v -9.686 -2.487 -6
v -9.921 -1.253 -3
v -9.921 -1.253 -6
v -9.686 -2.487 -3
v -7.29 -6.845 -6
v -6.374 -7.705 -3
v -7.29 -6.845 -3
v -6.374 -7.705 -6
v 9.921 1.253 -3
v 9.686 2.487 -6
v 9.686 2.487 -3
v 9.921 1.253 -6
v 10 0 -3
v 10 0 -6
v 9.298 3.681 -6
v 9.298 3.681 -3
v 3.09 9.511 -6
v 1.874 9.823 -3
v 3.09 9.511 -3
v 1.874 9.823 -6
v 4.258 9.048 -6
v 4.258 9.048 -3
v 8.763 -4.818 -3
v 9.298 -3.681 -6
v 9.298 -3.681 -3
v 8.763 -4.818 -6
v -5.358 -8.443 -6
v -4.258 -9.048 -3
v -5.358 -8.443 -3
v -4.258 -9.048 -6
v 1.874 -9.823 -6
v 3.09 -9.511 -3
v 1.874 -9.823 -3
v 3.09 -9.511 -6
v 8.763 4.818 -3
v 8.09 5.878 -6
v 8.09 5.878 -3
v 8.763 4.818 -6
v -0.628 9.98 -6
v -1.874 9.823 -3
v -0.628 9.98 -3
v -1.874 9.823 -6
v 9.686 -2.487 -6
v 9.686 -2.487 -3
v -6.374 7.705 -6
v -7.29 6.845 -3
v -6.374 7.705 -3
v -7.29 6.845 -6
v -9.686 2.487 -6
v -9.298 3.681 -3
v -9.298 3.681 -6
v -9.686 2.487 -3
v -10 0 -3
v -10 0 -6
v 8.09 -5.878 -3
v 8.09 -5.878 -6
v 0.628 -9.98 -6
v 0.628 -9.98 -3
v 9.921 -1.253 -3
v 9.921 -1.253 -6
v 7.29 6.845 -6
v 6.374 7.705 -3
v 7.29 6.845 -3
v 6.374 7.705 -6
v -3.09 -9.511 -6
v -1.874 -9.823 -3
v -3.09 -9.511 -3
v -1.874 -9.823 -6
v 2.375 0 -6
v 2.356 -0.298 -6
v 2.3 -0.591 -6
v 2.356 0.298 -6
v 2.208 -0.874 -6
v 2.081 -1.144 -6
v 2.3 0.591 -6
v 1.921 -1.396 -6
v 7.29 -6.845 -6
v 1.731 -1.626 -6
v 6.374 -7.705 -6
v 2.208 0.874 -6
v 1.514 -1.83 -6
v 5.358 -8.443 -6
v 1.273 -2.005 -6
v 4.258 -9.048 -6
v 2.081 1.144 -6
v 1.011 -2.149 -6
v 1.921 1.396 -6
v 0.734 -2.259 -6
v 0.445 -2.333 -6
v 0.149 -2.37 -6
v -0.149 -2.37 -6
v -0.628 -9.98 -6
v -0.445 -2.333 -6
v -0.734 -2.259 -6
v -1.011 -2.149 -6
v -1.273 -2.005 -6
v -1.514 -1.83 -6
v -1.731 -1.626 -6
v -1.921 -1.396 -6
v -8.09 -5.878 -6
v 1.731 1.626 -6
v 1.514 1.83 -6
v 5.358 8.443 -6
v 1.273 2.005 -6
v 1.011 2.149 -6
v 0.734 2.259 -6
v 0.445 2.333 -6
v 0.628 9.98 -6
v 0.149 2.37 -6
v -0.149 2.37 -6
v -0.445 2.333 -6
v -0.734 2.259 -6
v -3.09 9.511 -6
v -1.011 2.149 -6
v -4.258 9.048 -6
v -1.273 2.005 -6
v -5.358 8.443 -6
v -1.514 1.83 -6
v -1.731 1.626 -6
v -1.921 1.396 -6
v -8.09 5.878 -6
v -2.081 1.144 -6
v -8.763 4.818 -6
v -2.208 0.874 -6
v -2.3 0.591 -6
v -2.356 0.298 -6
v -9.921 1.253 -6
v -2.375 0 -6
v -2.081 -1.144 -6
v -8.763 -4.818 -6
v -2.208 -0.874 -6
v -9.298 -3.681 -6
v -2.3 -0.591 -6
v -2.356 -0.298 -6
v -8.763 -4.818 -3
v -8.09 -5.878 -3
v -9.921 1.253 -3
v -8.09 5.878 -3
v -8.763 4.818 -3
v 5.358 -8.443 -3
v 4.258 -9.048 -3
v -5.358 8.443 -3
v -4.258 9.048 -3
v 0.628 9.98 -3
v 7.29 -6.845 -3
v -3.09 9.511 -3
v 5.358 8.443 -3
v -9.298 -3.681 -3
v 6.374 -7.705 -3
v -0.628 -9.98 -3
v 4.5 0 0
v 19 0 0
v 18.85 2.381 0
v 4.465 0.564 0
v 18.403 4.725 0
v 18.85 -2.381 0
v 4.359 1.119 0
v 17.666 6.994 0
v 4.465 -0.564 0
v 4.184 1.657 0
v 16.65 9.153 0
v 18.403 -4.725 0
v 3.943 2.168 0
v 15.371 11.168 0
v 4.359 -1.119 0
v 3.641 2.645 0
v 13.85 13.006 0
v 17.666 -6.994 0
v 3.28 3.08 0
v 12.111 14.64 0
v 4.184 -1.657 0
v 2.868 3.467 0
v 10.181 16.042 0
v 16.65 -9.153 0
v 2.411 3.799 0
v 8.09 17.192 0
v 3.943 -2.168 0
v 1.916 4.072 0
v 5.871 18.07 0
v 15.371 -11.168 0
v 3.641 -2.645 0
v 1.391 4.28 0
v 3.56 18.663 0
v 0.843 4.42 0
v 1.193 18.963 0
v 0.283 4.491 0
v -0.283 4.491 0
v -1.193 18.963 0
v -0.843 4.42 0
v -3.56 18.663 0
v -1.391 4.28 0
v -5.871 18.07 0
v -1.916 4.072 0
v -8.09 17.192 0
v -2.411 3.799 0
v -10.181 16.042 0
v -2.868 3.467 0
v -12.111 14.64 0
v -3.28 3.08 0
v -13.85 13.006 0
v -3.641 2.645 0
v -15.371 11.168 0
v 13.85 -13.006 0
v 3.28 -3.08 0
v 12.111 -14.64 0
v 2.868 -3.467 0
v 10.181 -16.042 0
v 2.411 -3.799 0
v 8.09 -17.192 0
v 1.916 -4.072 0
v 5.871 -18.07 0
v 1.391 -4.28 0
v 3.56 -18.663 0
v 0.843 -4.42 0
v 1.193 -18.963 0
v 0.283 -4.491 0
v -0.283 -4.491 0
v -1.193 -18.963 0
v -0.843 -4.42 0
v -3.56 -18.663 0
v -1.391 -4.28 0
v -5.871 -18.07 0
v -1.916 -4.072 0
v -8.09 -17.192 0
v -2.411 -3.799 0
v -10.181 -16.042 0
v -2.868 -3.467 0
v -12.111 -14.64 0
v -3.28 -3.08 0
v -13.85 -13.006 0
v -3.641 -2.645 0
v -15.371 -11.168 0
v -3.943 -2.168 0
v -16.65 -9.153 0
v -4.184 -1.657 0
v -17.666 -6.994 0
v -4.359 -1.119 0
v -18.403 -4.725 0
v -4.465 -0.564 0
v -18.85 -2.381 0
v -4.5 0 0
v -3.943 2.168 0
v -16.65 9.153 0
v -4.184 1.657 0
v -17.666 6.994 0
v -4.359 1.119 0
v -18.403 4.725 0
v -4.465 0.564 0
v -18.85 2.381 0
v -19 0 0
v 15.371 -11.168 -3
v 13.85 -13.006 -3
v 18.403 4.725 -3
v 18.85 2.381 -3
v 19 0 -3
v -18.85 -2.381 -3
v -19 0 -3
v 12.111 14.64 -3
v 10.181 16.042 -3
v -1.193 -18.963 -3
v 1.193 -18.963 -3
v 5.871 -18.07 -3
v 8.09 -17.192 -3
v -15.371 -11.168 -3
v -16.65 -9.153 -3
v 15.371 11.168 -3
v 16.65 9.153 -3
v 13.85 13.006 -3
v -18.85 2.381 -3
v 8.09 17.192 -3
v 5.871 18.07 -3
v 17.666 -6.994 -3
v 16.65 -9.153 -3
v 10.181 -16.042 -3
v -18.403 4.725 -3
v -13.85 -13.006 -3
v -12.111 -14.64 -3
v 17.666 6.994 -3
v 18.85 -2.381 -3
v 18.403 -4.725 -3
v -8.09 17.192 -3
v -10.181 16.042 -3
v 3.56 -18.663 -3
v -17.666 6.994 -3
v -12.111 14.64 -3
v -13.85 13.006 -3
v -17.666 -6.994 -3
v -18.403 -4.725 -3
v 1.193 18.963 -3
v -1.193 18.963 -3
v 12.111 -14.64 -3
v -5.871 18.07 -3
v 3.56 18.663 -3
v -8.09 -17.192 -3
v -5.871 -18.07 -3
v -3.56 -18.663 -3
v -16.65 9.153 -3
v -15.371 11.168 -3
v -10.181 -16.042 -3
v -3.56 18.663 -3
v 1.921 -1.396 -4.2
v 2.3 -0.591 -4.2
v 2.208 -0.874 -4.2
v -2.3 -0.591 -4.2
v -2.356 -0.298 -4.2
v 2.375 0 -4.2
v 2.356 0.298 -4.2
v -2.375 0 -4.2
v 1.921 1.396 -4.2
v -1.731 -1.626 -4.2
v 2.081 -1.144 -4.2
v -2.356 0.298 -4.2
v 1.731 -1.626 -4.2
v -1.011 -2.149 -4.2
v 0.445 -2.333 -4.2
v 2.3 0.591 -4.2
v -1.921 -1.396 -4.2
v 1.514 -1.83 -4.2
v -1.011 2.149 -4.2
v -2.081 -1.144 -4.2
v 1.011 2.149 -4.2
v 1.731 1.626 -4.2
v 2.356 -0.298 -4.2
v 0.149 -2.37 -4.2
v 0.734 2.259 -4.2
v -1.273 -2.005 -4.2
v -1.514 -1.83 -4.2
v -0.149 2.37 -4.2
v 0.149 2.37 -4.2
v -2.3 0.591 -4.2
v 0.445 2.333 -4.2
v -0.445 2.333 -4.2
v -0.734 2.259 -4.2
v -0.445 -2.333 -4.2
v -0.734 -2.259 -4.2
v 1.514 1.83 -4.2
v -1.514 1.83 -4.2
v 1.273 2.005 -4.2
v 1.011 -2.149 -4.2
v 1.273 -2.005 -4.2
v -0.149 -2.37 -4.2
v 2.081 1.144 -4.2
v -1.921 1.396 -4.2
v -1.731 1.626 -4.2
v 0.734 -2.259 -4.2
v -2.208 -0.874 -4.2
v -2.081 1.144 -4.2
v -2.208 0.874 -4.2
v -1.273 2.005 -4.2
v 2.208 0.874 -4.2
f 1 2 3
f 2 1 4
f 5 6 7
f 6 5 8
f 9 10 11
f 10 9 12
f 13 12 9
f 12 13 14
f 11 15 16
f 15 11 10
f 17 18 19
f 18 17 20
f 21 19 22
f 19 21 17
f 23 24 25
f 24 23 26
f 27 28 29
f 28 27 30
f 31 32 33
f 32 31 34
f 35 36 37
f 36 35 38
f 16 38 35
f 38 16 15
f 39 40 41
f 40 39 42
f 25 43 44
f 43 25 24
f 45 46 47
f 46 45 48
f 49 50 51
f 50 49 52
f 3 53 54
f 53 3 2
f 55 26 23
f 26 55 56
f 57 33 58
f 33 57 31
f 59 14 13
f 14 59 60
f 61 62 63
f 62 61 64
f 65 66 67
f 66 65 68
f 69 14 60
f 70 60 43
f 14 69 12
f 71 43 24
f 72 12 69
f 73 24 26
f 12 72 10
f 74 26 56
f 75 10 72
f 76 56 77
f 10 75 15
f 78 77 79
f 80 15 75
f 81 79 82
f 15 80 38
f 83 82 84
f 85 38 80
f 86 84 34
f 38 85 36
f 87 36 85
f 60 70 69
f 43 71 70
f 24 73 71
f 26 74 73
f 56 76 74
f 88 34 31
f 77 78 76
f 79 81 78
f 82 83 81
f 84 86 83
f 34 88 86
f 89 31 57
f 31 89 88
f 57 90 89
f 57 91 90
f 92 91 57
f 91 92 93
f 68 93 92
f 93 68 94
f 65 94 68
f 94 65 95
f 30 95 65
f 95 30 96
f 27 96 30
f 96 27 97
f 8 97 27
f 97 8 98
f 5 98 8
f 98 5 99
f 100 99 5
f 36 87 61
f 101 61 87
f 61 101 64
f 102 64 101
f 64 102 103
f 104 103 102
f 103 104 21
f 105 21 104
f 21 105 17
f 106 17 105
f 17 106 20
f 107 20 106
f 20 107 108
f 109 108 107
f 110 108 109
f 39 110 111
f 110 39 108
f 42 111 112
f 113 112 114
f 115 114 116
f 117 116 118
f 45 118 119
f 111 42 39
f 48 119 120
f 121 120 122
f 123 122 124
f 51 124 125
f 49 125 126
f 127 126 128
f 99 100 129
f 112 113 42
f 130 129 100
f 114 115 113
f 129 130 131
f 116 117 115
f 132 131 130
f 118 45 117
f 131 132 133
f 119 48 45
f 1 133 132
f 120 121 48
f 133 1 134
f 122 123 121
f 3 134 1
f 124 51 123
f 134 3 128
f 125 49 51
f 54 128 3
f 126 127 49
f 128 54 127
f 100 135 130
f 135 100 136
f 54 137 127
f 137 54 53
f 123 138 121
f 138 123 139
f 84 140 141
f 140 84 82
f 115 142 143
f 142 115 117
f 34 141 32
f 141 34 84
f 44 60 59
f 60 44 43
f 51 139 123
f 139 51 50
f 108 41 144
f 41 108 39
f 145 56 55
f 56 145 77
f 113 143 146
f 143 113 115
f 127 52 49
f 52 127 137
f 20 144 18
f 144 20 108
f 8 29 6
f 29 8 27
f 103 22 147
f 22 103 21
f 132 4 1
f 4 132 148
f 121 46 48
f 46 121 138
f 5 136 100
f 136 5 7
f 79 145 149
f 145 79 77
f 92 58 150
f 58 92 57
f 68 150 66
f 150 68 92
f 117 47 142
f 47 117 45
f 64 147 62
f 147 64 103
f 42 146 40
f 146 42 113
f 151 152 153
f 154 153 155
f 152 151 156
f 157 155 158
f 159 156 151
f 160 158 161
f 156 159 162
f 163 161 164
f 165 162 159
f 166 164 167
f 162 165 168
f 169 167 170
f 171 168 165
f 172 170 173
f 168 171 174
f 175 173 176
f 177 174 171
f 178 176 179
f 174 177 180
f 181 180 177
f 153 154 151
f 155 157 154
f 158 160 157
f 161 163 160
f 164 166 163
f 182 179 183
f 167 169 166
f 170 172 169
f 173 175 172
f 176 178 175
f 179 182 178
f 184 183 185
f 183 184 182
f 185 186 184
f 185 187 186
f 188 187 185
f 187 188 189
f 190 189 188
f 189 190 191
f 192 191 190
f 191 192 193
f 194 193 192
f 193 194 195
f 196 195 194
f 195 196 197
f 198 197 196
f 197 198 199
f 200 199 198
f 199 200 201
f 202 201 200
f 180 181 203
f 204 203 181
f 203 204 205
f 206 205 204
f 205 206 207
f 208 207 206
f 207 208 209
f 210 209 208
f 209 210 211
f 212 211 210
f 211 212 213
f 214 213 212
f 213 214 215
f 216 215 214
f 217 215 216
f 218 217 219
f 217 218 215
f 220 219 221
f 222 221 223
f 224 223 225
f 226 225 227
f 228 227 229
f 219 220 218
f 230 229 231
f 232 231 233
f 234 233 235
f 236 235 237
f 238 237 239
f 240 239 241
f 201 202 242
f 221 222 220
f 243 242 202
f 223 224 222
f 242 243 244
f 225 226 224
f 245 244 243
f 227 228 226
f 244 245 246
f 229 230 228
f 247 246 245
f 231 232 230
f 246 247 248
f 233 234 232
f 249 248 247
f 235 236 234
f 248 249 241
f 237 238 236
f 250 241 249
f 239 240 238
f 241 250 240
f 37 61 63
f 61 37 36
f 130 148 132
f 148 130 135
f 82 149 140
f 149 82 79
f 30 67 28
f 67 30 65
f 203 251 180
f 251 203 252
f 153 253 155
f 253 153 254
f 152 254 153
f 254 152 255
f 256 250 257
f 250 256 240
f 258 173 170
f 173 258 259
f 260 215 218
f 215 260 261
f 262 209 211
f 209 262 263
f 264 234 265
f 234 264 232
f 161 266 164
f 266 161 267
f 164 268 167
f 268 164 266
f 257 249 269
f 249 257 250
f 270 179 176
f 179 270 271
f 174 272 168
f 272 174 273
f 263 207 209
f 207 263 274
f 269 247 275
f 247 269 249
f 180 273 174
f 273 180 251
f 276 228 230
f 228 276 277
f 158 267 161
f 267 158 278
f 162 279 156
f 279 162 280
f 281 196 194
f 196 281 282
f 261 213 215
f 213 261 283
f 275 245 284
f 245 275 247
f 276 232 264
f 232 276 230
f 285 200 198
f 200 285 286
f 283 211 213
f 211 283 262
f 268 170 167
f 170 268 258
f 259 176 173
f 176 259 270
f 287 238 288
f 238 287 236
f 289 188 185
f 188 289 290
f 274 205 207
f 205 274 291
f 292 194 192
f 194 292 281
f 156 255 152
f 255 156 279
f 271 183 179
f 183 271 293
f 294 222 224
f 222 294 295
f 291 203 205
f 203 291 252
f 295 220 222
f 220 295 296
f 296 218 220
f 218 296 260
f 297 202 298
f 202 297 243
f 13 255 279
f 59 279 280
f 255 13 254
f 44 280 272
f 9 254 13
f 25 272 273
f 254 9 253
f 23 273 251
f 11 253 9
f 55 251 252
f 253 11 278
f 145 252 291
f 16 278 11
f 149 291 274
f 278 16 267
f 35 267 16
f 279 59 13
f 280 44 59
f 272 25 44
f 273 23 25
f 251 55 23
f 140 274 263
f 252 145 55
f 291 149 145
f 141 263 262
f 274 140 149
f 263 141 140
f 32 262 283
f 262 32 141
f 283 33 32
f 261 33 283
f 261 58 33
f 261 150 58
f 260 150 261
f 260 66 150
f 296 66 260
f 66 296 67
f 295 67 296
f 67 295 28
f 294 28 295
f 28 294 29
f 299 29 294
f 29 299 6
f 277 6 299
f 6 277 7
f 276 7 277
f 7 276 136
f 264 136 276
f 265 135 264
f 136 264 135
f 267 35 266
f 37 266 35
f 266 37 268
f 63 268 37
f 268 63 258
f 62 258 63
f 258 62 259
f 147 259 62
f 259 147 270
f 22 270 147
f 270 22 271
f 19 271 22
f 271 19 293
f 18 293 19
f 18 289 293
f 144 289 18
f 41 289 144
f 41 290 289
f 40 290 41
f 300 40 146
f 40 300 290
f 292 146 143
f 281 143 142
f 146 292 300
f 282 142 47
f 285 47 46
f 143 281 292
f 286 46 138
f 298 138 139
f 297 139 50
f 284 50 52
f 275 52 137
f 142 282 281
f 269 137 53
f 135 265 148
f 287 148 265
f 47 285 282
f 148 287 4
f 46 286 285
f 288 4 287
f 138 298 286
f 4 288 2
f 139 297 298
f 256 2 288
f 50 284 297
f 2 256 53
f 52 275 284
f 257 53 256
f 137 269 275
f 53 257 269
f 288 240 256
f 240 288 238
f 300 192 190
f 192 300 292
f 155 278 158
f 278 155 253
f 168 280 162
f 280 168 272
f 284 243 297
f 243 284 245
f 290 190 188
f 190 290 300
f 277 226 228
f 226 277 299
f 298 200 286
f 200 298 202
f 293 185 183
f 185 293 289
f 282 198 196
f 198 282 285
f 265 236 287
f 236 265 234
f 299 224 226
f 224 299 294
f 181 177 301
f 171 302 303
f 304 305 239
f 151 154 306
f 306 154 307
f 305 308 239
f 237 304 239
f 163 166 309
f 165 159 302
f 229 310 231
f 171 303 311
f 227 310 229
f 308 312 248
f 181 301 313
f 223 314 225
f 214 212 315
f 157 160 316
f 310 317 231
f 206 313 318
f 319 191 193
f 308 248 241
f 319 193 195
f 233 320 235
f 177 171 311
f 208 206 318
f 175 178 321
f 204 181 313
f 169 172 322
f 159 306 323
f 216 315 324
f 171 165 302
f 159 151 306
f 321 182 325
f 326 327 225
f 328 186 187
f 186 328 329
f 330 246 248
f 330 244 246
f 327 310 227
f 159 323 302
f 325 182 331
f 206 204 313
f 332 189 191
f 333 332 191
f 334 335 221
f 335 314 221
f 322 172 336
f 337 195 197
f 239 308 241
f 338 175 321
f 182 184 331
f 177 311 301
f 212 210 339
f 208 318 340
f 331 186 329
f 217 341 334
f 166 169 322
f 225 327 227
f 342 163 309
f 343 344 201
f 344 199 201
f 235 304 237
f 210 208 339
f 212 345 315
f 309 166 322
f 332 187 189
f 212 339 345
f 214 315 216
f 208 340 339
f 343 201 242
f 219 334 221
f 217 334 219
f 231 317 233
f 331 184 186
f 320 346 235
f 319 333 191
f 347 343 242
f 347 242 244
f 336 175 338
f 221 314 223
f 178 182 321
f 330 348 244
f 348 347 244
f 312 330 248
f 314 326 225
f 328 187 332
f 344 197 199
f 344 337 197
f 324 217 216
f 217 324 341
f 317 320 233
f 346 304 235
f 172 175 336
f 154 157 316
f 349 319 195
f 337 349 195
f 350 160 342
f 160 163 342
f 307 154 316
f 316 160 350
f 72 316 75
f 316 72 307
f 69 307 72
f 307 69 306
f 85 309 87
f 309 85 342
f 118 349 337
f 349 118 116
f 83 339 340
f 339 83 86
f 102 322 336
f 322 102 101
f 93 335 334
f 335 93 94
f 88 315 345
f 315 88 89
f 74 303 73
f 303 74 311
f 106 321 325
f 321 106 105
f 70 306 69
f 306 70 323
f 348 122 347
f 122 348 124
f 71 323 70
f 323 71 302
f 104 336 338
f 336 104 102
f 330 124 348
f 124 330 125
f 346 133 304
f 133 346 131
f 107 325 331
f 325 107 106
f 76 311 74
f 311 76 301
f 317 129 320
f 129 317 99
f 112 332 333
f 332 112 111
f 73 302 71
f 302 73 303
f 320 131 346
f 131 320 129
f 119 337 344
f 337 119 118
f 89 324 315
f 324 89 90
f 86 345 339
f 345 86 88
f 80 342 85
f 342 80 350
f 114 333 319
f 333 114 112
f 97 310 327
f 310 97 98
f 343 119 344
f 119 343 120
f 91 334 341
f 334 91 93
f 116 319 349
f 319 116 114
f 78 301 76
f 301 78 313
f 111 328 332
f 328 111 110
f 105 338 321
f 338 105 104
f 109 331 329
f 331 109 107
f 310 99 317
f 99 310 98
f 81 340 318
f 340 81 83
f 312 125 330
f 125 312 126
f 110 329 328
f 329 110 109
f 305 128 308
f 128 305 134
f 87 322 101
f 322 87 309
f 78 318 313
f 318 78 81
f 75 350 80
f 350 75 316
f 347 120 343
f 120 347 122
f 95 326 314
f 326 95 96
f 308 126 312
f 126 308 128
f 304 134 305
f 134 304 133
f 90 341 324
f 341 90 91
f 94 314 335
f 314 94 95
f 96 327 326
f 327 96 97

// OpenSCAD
$fn = 50;


difference() {
	union() {
		translate(v = [0, 0, -6.0000000000]) {
			cylinder(h = 6, r = 10.0000000000);
		}
		translate(v = [0, 0, -3.0000000000]) {
			cylinder(h = 3, r = 19.0000000000);
		}
	}
	union() {
		translate(v = [0, 0, 0]) {
			rotate(a = [0, 0, 0]) {
				difference() {
					union() {
						#translate(v = [0, 0, -6.0000000000]) {
							cylinder(h = 6, r = 2.2500000000);
						}
						#translate(v = [0, 0, -4.2000000000]) {
							cylinder(h = 4.2000000000, r = 10.0000000000, r1 = 2.3750000000, r2 = 4.5000000000);
						}
						#translate(v = [0, 0, -6.0000000000]) {
							cylinder(h = 6, r = 2.3750000000);
						}
						#translate(v = [0, 0, -6.0000000000]) {
							cylinder(h = 6, r = 2.2500000000);
						}
					}
					union();
				}
			}
		}
	}
}
